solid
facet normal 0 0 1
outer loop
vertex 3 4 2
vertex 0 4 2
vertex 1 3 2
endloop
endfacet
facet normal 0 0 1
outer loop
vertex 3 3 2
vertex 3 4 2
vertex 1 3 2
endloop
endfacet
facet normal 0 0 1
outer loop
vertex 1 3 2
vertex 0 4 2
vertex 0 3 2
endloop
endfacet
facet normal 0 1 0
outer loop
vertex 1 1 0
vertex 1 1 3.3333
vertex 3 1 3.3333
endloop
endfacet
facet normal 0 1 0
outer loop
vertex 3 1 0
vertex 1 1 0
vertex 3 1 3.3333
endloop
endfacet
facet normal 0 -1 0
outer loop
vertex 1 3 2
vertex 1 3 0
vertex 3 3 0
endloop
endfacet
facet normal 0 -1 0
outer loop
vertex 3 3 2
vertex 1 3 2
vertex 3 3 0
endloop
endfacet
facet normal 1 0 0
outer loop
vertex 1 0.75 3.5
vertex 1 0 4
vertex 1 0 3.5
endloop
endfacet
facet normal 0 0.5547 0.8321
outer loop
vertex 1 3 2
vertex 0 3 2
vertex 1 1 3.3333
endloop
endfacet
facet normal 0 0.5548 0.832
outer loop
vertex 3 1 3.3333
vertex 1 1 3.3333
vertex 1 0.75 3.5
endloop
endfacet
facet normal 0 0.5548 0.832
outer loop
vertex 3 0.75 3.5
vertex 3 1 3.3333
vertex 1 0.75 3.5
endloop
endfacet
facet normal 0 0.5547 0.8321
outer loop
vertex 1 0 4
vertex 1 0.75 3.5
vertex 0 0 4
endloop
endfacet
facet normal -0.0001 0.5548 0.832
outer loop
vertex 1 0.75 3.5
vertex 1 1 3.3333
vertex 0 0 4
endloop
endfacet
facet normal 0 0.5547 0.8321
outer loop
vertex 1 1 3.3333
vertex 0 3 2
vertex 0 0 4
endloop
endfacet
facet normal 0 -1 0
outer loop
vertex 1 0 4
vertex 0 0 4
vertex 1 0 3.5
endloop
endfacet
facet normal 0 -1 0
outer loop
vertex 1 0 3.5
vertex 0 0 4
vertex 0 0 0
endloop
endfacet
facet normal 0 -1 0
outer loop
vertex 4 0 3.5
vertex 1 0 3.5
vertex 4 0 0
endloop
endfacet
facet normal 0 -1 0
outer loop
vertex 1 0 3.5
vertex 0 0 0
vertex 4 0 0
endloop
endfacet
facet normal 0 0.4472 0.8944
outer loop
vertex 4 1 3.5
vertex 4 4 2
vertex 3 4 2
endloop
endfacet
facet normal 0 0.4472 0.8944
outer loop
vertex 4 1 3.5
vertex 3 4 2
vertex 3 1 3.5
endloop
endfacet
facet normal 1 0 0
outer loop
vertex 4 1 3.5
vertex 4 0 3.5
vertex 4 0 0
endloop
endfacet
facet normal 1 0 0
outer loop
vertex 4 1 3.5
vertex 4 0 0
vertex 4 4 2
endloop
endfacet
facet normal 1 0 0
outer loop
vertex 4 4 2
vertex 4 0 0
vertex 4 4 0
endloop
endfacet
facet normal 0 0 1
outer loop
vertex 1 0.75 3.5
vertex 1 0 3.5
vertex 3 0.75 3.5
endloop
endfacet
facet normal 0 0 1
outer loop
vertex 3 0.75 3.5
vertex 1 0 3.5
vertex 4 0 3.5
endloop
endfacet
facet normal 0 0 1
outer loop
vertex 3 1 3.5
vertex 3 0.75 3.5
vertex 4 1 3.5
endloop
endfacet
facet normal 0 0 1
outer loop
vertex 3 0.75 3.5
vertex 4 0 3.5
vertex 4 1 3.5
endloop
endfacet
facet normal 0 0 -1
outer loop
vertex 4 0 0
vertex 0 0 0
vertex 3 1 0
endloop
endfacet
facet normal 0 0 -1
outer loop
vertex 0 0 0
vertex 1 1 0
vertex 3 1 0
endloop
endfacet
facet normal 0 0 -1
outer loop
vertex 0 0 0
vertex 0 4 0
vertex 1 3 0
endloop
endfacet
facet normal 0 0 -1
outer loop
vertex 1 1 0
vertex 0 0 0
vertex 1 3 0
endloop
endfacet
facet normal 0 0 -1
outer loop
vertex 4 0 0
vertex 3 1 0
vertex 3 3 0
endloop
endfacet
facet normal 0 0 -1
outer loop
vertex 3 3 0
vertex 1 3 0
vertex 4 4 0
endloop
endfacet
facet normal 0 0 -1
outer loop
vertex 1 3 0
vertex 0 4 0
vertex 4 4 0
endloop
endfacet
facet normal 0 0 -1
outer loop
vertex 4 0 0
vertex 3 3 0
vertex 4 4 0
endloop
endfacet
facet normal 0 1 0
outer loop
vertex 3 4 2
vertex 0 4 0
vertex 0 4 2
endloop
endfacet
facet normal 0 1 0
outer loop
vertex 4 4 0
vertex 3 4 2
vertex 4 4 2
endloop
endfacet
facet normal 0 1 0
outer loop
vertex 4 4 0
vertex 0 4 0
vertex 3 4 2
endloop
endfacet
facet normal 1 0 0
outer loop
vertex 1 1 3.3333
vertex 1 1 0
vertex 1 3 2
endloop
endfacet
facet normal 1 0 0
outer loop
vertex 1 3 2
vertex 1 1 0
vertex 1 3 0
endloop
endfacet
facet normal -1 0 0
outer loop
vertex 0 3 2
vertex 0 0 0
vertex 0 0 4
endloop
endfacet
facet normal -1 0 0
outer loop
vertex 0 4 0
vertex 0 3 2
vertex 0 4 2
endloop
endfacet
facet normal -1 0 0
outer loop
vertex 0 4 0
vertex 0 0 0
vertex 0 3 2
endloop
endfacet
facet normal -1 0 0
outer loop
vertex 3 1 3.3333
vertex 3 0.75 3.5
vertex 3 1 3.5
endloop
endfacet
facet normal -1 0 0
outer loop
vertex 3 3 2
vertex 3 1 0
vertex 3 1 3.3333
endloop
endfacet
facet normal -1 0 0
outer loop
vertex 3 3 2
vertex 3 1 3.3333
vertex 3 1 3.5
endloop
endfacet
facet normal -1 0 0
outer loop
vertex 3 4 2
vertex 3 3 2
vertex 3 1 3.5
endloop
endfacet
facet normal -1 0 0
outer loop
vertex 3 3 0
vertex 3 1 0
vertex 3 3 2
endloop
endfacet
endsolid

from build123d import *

# Parameters (mm, degrees)
SKETCH1_W           = 4
SKETCH1_H           = 4
SKETCH1_W_2         = 2
SKETCH1_H_2         = 2
BOSS_EXTRUDE1_DEPTH = 4
CUT_EXTRUDE1_DEPTH  = 4
CUT_EXTRUDE2_DEPTH  = 3
CUT_EXTRUDE3_DEPTH  = 3
CUT_EXTRUDE5_DEPTH  = 3


with BuildPart() as part:
    # Sketch1 → Boss-Extrude1 (new body)
    with BuildSketch(Plane.XY):
        with Locations((2, 2)):
            Rectangle(SKETCH1_W, SKETCH1_H)
        with Locations((2, 2)):
            Rectangle(SKETCH1_W_2, SKETCH1_H_2, mode=Mode.SUBTRACT)
    extrude(amount=BOSS_EXTRUDE1_DEPTH)

    # Sketch2 → Cut-Extrude1 (cut)
    with BuildSketch(Plane(origin=(4, 0, 0), x_dir=(0, 0, -1), z_dir=(1, 0, 0))):
        Polygon((-2, 4), (-4, 0), (-4, 4), align=None)
    extrude(amount=-CUT_EXTRUDE1_DEPTH, mode=Mode.SUBTRACT)

    # Sketch3 → Cut-Extrude2 (cut)
    with BuildSketch(Plane.ZY):
        Polygon((2, 4), (2, 3), (2.5, 3), align=None)
    extrude(amount=-CUT_EXTRUDE2_DEPTH, mode=Mode.SUBTRACT)

    # Sketch4 → Cut-Extrude3 (cut)
    with BuildSketch(Plane.ZY):
        Polygon((2, 3), (4, 0), (4, 3.222768016), align=None)
    extrude(amount=-CUT_EXTRUDE3_DEPTH, mode=Mode.SUBTRACT)

    # Sketch6 → Cut-Extrude5 (cut)
    with BuildSketch(Plane(origin=(4, 0, 0), x_dir=(0, 0, -1), z_dir=(1, 0, 0))):
        Polygon((-3.5, 0), (-3.5, 1), (-4, 0), align=None)
    extrude(amount=-CUT_EXTRUDE5_DEPTH, mode=Mode.SUBTRACT)


solid = part.part
